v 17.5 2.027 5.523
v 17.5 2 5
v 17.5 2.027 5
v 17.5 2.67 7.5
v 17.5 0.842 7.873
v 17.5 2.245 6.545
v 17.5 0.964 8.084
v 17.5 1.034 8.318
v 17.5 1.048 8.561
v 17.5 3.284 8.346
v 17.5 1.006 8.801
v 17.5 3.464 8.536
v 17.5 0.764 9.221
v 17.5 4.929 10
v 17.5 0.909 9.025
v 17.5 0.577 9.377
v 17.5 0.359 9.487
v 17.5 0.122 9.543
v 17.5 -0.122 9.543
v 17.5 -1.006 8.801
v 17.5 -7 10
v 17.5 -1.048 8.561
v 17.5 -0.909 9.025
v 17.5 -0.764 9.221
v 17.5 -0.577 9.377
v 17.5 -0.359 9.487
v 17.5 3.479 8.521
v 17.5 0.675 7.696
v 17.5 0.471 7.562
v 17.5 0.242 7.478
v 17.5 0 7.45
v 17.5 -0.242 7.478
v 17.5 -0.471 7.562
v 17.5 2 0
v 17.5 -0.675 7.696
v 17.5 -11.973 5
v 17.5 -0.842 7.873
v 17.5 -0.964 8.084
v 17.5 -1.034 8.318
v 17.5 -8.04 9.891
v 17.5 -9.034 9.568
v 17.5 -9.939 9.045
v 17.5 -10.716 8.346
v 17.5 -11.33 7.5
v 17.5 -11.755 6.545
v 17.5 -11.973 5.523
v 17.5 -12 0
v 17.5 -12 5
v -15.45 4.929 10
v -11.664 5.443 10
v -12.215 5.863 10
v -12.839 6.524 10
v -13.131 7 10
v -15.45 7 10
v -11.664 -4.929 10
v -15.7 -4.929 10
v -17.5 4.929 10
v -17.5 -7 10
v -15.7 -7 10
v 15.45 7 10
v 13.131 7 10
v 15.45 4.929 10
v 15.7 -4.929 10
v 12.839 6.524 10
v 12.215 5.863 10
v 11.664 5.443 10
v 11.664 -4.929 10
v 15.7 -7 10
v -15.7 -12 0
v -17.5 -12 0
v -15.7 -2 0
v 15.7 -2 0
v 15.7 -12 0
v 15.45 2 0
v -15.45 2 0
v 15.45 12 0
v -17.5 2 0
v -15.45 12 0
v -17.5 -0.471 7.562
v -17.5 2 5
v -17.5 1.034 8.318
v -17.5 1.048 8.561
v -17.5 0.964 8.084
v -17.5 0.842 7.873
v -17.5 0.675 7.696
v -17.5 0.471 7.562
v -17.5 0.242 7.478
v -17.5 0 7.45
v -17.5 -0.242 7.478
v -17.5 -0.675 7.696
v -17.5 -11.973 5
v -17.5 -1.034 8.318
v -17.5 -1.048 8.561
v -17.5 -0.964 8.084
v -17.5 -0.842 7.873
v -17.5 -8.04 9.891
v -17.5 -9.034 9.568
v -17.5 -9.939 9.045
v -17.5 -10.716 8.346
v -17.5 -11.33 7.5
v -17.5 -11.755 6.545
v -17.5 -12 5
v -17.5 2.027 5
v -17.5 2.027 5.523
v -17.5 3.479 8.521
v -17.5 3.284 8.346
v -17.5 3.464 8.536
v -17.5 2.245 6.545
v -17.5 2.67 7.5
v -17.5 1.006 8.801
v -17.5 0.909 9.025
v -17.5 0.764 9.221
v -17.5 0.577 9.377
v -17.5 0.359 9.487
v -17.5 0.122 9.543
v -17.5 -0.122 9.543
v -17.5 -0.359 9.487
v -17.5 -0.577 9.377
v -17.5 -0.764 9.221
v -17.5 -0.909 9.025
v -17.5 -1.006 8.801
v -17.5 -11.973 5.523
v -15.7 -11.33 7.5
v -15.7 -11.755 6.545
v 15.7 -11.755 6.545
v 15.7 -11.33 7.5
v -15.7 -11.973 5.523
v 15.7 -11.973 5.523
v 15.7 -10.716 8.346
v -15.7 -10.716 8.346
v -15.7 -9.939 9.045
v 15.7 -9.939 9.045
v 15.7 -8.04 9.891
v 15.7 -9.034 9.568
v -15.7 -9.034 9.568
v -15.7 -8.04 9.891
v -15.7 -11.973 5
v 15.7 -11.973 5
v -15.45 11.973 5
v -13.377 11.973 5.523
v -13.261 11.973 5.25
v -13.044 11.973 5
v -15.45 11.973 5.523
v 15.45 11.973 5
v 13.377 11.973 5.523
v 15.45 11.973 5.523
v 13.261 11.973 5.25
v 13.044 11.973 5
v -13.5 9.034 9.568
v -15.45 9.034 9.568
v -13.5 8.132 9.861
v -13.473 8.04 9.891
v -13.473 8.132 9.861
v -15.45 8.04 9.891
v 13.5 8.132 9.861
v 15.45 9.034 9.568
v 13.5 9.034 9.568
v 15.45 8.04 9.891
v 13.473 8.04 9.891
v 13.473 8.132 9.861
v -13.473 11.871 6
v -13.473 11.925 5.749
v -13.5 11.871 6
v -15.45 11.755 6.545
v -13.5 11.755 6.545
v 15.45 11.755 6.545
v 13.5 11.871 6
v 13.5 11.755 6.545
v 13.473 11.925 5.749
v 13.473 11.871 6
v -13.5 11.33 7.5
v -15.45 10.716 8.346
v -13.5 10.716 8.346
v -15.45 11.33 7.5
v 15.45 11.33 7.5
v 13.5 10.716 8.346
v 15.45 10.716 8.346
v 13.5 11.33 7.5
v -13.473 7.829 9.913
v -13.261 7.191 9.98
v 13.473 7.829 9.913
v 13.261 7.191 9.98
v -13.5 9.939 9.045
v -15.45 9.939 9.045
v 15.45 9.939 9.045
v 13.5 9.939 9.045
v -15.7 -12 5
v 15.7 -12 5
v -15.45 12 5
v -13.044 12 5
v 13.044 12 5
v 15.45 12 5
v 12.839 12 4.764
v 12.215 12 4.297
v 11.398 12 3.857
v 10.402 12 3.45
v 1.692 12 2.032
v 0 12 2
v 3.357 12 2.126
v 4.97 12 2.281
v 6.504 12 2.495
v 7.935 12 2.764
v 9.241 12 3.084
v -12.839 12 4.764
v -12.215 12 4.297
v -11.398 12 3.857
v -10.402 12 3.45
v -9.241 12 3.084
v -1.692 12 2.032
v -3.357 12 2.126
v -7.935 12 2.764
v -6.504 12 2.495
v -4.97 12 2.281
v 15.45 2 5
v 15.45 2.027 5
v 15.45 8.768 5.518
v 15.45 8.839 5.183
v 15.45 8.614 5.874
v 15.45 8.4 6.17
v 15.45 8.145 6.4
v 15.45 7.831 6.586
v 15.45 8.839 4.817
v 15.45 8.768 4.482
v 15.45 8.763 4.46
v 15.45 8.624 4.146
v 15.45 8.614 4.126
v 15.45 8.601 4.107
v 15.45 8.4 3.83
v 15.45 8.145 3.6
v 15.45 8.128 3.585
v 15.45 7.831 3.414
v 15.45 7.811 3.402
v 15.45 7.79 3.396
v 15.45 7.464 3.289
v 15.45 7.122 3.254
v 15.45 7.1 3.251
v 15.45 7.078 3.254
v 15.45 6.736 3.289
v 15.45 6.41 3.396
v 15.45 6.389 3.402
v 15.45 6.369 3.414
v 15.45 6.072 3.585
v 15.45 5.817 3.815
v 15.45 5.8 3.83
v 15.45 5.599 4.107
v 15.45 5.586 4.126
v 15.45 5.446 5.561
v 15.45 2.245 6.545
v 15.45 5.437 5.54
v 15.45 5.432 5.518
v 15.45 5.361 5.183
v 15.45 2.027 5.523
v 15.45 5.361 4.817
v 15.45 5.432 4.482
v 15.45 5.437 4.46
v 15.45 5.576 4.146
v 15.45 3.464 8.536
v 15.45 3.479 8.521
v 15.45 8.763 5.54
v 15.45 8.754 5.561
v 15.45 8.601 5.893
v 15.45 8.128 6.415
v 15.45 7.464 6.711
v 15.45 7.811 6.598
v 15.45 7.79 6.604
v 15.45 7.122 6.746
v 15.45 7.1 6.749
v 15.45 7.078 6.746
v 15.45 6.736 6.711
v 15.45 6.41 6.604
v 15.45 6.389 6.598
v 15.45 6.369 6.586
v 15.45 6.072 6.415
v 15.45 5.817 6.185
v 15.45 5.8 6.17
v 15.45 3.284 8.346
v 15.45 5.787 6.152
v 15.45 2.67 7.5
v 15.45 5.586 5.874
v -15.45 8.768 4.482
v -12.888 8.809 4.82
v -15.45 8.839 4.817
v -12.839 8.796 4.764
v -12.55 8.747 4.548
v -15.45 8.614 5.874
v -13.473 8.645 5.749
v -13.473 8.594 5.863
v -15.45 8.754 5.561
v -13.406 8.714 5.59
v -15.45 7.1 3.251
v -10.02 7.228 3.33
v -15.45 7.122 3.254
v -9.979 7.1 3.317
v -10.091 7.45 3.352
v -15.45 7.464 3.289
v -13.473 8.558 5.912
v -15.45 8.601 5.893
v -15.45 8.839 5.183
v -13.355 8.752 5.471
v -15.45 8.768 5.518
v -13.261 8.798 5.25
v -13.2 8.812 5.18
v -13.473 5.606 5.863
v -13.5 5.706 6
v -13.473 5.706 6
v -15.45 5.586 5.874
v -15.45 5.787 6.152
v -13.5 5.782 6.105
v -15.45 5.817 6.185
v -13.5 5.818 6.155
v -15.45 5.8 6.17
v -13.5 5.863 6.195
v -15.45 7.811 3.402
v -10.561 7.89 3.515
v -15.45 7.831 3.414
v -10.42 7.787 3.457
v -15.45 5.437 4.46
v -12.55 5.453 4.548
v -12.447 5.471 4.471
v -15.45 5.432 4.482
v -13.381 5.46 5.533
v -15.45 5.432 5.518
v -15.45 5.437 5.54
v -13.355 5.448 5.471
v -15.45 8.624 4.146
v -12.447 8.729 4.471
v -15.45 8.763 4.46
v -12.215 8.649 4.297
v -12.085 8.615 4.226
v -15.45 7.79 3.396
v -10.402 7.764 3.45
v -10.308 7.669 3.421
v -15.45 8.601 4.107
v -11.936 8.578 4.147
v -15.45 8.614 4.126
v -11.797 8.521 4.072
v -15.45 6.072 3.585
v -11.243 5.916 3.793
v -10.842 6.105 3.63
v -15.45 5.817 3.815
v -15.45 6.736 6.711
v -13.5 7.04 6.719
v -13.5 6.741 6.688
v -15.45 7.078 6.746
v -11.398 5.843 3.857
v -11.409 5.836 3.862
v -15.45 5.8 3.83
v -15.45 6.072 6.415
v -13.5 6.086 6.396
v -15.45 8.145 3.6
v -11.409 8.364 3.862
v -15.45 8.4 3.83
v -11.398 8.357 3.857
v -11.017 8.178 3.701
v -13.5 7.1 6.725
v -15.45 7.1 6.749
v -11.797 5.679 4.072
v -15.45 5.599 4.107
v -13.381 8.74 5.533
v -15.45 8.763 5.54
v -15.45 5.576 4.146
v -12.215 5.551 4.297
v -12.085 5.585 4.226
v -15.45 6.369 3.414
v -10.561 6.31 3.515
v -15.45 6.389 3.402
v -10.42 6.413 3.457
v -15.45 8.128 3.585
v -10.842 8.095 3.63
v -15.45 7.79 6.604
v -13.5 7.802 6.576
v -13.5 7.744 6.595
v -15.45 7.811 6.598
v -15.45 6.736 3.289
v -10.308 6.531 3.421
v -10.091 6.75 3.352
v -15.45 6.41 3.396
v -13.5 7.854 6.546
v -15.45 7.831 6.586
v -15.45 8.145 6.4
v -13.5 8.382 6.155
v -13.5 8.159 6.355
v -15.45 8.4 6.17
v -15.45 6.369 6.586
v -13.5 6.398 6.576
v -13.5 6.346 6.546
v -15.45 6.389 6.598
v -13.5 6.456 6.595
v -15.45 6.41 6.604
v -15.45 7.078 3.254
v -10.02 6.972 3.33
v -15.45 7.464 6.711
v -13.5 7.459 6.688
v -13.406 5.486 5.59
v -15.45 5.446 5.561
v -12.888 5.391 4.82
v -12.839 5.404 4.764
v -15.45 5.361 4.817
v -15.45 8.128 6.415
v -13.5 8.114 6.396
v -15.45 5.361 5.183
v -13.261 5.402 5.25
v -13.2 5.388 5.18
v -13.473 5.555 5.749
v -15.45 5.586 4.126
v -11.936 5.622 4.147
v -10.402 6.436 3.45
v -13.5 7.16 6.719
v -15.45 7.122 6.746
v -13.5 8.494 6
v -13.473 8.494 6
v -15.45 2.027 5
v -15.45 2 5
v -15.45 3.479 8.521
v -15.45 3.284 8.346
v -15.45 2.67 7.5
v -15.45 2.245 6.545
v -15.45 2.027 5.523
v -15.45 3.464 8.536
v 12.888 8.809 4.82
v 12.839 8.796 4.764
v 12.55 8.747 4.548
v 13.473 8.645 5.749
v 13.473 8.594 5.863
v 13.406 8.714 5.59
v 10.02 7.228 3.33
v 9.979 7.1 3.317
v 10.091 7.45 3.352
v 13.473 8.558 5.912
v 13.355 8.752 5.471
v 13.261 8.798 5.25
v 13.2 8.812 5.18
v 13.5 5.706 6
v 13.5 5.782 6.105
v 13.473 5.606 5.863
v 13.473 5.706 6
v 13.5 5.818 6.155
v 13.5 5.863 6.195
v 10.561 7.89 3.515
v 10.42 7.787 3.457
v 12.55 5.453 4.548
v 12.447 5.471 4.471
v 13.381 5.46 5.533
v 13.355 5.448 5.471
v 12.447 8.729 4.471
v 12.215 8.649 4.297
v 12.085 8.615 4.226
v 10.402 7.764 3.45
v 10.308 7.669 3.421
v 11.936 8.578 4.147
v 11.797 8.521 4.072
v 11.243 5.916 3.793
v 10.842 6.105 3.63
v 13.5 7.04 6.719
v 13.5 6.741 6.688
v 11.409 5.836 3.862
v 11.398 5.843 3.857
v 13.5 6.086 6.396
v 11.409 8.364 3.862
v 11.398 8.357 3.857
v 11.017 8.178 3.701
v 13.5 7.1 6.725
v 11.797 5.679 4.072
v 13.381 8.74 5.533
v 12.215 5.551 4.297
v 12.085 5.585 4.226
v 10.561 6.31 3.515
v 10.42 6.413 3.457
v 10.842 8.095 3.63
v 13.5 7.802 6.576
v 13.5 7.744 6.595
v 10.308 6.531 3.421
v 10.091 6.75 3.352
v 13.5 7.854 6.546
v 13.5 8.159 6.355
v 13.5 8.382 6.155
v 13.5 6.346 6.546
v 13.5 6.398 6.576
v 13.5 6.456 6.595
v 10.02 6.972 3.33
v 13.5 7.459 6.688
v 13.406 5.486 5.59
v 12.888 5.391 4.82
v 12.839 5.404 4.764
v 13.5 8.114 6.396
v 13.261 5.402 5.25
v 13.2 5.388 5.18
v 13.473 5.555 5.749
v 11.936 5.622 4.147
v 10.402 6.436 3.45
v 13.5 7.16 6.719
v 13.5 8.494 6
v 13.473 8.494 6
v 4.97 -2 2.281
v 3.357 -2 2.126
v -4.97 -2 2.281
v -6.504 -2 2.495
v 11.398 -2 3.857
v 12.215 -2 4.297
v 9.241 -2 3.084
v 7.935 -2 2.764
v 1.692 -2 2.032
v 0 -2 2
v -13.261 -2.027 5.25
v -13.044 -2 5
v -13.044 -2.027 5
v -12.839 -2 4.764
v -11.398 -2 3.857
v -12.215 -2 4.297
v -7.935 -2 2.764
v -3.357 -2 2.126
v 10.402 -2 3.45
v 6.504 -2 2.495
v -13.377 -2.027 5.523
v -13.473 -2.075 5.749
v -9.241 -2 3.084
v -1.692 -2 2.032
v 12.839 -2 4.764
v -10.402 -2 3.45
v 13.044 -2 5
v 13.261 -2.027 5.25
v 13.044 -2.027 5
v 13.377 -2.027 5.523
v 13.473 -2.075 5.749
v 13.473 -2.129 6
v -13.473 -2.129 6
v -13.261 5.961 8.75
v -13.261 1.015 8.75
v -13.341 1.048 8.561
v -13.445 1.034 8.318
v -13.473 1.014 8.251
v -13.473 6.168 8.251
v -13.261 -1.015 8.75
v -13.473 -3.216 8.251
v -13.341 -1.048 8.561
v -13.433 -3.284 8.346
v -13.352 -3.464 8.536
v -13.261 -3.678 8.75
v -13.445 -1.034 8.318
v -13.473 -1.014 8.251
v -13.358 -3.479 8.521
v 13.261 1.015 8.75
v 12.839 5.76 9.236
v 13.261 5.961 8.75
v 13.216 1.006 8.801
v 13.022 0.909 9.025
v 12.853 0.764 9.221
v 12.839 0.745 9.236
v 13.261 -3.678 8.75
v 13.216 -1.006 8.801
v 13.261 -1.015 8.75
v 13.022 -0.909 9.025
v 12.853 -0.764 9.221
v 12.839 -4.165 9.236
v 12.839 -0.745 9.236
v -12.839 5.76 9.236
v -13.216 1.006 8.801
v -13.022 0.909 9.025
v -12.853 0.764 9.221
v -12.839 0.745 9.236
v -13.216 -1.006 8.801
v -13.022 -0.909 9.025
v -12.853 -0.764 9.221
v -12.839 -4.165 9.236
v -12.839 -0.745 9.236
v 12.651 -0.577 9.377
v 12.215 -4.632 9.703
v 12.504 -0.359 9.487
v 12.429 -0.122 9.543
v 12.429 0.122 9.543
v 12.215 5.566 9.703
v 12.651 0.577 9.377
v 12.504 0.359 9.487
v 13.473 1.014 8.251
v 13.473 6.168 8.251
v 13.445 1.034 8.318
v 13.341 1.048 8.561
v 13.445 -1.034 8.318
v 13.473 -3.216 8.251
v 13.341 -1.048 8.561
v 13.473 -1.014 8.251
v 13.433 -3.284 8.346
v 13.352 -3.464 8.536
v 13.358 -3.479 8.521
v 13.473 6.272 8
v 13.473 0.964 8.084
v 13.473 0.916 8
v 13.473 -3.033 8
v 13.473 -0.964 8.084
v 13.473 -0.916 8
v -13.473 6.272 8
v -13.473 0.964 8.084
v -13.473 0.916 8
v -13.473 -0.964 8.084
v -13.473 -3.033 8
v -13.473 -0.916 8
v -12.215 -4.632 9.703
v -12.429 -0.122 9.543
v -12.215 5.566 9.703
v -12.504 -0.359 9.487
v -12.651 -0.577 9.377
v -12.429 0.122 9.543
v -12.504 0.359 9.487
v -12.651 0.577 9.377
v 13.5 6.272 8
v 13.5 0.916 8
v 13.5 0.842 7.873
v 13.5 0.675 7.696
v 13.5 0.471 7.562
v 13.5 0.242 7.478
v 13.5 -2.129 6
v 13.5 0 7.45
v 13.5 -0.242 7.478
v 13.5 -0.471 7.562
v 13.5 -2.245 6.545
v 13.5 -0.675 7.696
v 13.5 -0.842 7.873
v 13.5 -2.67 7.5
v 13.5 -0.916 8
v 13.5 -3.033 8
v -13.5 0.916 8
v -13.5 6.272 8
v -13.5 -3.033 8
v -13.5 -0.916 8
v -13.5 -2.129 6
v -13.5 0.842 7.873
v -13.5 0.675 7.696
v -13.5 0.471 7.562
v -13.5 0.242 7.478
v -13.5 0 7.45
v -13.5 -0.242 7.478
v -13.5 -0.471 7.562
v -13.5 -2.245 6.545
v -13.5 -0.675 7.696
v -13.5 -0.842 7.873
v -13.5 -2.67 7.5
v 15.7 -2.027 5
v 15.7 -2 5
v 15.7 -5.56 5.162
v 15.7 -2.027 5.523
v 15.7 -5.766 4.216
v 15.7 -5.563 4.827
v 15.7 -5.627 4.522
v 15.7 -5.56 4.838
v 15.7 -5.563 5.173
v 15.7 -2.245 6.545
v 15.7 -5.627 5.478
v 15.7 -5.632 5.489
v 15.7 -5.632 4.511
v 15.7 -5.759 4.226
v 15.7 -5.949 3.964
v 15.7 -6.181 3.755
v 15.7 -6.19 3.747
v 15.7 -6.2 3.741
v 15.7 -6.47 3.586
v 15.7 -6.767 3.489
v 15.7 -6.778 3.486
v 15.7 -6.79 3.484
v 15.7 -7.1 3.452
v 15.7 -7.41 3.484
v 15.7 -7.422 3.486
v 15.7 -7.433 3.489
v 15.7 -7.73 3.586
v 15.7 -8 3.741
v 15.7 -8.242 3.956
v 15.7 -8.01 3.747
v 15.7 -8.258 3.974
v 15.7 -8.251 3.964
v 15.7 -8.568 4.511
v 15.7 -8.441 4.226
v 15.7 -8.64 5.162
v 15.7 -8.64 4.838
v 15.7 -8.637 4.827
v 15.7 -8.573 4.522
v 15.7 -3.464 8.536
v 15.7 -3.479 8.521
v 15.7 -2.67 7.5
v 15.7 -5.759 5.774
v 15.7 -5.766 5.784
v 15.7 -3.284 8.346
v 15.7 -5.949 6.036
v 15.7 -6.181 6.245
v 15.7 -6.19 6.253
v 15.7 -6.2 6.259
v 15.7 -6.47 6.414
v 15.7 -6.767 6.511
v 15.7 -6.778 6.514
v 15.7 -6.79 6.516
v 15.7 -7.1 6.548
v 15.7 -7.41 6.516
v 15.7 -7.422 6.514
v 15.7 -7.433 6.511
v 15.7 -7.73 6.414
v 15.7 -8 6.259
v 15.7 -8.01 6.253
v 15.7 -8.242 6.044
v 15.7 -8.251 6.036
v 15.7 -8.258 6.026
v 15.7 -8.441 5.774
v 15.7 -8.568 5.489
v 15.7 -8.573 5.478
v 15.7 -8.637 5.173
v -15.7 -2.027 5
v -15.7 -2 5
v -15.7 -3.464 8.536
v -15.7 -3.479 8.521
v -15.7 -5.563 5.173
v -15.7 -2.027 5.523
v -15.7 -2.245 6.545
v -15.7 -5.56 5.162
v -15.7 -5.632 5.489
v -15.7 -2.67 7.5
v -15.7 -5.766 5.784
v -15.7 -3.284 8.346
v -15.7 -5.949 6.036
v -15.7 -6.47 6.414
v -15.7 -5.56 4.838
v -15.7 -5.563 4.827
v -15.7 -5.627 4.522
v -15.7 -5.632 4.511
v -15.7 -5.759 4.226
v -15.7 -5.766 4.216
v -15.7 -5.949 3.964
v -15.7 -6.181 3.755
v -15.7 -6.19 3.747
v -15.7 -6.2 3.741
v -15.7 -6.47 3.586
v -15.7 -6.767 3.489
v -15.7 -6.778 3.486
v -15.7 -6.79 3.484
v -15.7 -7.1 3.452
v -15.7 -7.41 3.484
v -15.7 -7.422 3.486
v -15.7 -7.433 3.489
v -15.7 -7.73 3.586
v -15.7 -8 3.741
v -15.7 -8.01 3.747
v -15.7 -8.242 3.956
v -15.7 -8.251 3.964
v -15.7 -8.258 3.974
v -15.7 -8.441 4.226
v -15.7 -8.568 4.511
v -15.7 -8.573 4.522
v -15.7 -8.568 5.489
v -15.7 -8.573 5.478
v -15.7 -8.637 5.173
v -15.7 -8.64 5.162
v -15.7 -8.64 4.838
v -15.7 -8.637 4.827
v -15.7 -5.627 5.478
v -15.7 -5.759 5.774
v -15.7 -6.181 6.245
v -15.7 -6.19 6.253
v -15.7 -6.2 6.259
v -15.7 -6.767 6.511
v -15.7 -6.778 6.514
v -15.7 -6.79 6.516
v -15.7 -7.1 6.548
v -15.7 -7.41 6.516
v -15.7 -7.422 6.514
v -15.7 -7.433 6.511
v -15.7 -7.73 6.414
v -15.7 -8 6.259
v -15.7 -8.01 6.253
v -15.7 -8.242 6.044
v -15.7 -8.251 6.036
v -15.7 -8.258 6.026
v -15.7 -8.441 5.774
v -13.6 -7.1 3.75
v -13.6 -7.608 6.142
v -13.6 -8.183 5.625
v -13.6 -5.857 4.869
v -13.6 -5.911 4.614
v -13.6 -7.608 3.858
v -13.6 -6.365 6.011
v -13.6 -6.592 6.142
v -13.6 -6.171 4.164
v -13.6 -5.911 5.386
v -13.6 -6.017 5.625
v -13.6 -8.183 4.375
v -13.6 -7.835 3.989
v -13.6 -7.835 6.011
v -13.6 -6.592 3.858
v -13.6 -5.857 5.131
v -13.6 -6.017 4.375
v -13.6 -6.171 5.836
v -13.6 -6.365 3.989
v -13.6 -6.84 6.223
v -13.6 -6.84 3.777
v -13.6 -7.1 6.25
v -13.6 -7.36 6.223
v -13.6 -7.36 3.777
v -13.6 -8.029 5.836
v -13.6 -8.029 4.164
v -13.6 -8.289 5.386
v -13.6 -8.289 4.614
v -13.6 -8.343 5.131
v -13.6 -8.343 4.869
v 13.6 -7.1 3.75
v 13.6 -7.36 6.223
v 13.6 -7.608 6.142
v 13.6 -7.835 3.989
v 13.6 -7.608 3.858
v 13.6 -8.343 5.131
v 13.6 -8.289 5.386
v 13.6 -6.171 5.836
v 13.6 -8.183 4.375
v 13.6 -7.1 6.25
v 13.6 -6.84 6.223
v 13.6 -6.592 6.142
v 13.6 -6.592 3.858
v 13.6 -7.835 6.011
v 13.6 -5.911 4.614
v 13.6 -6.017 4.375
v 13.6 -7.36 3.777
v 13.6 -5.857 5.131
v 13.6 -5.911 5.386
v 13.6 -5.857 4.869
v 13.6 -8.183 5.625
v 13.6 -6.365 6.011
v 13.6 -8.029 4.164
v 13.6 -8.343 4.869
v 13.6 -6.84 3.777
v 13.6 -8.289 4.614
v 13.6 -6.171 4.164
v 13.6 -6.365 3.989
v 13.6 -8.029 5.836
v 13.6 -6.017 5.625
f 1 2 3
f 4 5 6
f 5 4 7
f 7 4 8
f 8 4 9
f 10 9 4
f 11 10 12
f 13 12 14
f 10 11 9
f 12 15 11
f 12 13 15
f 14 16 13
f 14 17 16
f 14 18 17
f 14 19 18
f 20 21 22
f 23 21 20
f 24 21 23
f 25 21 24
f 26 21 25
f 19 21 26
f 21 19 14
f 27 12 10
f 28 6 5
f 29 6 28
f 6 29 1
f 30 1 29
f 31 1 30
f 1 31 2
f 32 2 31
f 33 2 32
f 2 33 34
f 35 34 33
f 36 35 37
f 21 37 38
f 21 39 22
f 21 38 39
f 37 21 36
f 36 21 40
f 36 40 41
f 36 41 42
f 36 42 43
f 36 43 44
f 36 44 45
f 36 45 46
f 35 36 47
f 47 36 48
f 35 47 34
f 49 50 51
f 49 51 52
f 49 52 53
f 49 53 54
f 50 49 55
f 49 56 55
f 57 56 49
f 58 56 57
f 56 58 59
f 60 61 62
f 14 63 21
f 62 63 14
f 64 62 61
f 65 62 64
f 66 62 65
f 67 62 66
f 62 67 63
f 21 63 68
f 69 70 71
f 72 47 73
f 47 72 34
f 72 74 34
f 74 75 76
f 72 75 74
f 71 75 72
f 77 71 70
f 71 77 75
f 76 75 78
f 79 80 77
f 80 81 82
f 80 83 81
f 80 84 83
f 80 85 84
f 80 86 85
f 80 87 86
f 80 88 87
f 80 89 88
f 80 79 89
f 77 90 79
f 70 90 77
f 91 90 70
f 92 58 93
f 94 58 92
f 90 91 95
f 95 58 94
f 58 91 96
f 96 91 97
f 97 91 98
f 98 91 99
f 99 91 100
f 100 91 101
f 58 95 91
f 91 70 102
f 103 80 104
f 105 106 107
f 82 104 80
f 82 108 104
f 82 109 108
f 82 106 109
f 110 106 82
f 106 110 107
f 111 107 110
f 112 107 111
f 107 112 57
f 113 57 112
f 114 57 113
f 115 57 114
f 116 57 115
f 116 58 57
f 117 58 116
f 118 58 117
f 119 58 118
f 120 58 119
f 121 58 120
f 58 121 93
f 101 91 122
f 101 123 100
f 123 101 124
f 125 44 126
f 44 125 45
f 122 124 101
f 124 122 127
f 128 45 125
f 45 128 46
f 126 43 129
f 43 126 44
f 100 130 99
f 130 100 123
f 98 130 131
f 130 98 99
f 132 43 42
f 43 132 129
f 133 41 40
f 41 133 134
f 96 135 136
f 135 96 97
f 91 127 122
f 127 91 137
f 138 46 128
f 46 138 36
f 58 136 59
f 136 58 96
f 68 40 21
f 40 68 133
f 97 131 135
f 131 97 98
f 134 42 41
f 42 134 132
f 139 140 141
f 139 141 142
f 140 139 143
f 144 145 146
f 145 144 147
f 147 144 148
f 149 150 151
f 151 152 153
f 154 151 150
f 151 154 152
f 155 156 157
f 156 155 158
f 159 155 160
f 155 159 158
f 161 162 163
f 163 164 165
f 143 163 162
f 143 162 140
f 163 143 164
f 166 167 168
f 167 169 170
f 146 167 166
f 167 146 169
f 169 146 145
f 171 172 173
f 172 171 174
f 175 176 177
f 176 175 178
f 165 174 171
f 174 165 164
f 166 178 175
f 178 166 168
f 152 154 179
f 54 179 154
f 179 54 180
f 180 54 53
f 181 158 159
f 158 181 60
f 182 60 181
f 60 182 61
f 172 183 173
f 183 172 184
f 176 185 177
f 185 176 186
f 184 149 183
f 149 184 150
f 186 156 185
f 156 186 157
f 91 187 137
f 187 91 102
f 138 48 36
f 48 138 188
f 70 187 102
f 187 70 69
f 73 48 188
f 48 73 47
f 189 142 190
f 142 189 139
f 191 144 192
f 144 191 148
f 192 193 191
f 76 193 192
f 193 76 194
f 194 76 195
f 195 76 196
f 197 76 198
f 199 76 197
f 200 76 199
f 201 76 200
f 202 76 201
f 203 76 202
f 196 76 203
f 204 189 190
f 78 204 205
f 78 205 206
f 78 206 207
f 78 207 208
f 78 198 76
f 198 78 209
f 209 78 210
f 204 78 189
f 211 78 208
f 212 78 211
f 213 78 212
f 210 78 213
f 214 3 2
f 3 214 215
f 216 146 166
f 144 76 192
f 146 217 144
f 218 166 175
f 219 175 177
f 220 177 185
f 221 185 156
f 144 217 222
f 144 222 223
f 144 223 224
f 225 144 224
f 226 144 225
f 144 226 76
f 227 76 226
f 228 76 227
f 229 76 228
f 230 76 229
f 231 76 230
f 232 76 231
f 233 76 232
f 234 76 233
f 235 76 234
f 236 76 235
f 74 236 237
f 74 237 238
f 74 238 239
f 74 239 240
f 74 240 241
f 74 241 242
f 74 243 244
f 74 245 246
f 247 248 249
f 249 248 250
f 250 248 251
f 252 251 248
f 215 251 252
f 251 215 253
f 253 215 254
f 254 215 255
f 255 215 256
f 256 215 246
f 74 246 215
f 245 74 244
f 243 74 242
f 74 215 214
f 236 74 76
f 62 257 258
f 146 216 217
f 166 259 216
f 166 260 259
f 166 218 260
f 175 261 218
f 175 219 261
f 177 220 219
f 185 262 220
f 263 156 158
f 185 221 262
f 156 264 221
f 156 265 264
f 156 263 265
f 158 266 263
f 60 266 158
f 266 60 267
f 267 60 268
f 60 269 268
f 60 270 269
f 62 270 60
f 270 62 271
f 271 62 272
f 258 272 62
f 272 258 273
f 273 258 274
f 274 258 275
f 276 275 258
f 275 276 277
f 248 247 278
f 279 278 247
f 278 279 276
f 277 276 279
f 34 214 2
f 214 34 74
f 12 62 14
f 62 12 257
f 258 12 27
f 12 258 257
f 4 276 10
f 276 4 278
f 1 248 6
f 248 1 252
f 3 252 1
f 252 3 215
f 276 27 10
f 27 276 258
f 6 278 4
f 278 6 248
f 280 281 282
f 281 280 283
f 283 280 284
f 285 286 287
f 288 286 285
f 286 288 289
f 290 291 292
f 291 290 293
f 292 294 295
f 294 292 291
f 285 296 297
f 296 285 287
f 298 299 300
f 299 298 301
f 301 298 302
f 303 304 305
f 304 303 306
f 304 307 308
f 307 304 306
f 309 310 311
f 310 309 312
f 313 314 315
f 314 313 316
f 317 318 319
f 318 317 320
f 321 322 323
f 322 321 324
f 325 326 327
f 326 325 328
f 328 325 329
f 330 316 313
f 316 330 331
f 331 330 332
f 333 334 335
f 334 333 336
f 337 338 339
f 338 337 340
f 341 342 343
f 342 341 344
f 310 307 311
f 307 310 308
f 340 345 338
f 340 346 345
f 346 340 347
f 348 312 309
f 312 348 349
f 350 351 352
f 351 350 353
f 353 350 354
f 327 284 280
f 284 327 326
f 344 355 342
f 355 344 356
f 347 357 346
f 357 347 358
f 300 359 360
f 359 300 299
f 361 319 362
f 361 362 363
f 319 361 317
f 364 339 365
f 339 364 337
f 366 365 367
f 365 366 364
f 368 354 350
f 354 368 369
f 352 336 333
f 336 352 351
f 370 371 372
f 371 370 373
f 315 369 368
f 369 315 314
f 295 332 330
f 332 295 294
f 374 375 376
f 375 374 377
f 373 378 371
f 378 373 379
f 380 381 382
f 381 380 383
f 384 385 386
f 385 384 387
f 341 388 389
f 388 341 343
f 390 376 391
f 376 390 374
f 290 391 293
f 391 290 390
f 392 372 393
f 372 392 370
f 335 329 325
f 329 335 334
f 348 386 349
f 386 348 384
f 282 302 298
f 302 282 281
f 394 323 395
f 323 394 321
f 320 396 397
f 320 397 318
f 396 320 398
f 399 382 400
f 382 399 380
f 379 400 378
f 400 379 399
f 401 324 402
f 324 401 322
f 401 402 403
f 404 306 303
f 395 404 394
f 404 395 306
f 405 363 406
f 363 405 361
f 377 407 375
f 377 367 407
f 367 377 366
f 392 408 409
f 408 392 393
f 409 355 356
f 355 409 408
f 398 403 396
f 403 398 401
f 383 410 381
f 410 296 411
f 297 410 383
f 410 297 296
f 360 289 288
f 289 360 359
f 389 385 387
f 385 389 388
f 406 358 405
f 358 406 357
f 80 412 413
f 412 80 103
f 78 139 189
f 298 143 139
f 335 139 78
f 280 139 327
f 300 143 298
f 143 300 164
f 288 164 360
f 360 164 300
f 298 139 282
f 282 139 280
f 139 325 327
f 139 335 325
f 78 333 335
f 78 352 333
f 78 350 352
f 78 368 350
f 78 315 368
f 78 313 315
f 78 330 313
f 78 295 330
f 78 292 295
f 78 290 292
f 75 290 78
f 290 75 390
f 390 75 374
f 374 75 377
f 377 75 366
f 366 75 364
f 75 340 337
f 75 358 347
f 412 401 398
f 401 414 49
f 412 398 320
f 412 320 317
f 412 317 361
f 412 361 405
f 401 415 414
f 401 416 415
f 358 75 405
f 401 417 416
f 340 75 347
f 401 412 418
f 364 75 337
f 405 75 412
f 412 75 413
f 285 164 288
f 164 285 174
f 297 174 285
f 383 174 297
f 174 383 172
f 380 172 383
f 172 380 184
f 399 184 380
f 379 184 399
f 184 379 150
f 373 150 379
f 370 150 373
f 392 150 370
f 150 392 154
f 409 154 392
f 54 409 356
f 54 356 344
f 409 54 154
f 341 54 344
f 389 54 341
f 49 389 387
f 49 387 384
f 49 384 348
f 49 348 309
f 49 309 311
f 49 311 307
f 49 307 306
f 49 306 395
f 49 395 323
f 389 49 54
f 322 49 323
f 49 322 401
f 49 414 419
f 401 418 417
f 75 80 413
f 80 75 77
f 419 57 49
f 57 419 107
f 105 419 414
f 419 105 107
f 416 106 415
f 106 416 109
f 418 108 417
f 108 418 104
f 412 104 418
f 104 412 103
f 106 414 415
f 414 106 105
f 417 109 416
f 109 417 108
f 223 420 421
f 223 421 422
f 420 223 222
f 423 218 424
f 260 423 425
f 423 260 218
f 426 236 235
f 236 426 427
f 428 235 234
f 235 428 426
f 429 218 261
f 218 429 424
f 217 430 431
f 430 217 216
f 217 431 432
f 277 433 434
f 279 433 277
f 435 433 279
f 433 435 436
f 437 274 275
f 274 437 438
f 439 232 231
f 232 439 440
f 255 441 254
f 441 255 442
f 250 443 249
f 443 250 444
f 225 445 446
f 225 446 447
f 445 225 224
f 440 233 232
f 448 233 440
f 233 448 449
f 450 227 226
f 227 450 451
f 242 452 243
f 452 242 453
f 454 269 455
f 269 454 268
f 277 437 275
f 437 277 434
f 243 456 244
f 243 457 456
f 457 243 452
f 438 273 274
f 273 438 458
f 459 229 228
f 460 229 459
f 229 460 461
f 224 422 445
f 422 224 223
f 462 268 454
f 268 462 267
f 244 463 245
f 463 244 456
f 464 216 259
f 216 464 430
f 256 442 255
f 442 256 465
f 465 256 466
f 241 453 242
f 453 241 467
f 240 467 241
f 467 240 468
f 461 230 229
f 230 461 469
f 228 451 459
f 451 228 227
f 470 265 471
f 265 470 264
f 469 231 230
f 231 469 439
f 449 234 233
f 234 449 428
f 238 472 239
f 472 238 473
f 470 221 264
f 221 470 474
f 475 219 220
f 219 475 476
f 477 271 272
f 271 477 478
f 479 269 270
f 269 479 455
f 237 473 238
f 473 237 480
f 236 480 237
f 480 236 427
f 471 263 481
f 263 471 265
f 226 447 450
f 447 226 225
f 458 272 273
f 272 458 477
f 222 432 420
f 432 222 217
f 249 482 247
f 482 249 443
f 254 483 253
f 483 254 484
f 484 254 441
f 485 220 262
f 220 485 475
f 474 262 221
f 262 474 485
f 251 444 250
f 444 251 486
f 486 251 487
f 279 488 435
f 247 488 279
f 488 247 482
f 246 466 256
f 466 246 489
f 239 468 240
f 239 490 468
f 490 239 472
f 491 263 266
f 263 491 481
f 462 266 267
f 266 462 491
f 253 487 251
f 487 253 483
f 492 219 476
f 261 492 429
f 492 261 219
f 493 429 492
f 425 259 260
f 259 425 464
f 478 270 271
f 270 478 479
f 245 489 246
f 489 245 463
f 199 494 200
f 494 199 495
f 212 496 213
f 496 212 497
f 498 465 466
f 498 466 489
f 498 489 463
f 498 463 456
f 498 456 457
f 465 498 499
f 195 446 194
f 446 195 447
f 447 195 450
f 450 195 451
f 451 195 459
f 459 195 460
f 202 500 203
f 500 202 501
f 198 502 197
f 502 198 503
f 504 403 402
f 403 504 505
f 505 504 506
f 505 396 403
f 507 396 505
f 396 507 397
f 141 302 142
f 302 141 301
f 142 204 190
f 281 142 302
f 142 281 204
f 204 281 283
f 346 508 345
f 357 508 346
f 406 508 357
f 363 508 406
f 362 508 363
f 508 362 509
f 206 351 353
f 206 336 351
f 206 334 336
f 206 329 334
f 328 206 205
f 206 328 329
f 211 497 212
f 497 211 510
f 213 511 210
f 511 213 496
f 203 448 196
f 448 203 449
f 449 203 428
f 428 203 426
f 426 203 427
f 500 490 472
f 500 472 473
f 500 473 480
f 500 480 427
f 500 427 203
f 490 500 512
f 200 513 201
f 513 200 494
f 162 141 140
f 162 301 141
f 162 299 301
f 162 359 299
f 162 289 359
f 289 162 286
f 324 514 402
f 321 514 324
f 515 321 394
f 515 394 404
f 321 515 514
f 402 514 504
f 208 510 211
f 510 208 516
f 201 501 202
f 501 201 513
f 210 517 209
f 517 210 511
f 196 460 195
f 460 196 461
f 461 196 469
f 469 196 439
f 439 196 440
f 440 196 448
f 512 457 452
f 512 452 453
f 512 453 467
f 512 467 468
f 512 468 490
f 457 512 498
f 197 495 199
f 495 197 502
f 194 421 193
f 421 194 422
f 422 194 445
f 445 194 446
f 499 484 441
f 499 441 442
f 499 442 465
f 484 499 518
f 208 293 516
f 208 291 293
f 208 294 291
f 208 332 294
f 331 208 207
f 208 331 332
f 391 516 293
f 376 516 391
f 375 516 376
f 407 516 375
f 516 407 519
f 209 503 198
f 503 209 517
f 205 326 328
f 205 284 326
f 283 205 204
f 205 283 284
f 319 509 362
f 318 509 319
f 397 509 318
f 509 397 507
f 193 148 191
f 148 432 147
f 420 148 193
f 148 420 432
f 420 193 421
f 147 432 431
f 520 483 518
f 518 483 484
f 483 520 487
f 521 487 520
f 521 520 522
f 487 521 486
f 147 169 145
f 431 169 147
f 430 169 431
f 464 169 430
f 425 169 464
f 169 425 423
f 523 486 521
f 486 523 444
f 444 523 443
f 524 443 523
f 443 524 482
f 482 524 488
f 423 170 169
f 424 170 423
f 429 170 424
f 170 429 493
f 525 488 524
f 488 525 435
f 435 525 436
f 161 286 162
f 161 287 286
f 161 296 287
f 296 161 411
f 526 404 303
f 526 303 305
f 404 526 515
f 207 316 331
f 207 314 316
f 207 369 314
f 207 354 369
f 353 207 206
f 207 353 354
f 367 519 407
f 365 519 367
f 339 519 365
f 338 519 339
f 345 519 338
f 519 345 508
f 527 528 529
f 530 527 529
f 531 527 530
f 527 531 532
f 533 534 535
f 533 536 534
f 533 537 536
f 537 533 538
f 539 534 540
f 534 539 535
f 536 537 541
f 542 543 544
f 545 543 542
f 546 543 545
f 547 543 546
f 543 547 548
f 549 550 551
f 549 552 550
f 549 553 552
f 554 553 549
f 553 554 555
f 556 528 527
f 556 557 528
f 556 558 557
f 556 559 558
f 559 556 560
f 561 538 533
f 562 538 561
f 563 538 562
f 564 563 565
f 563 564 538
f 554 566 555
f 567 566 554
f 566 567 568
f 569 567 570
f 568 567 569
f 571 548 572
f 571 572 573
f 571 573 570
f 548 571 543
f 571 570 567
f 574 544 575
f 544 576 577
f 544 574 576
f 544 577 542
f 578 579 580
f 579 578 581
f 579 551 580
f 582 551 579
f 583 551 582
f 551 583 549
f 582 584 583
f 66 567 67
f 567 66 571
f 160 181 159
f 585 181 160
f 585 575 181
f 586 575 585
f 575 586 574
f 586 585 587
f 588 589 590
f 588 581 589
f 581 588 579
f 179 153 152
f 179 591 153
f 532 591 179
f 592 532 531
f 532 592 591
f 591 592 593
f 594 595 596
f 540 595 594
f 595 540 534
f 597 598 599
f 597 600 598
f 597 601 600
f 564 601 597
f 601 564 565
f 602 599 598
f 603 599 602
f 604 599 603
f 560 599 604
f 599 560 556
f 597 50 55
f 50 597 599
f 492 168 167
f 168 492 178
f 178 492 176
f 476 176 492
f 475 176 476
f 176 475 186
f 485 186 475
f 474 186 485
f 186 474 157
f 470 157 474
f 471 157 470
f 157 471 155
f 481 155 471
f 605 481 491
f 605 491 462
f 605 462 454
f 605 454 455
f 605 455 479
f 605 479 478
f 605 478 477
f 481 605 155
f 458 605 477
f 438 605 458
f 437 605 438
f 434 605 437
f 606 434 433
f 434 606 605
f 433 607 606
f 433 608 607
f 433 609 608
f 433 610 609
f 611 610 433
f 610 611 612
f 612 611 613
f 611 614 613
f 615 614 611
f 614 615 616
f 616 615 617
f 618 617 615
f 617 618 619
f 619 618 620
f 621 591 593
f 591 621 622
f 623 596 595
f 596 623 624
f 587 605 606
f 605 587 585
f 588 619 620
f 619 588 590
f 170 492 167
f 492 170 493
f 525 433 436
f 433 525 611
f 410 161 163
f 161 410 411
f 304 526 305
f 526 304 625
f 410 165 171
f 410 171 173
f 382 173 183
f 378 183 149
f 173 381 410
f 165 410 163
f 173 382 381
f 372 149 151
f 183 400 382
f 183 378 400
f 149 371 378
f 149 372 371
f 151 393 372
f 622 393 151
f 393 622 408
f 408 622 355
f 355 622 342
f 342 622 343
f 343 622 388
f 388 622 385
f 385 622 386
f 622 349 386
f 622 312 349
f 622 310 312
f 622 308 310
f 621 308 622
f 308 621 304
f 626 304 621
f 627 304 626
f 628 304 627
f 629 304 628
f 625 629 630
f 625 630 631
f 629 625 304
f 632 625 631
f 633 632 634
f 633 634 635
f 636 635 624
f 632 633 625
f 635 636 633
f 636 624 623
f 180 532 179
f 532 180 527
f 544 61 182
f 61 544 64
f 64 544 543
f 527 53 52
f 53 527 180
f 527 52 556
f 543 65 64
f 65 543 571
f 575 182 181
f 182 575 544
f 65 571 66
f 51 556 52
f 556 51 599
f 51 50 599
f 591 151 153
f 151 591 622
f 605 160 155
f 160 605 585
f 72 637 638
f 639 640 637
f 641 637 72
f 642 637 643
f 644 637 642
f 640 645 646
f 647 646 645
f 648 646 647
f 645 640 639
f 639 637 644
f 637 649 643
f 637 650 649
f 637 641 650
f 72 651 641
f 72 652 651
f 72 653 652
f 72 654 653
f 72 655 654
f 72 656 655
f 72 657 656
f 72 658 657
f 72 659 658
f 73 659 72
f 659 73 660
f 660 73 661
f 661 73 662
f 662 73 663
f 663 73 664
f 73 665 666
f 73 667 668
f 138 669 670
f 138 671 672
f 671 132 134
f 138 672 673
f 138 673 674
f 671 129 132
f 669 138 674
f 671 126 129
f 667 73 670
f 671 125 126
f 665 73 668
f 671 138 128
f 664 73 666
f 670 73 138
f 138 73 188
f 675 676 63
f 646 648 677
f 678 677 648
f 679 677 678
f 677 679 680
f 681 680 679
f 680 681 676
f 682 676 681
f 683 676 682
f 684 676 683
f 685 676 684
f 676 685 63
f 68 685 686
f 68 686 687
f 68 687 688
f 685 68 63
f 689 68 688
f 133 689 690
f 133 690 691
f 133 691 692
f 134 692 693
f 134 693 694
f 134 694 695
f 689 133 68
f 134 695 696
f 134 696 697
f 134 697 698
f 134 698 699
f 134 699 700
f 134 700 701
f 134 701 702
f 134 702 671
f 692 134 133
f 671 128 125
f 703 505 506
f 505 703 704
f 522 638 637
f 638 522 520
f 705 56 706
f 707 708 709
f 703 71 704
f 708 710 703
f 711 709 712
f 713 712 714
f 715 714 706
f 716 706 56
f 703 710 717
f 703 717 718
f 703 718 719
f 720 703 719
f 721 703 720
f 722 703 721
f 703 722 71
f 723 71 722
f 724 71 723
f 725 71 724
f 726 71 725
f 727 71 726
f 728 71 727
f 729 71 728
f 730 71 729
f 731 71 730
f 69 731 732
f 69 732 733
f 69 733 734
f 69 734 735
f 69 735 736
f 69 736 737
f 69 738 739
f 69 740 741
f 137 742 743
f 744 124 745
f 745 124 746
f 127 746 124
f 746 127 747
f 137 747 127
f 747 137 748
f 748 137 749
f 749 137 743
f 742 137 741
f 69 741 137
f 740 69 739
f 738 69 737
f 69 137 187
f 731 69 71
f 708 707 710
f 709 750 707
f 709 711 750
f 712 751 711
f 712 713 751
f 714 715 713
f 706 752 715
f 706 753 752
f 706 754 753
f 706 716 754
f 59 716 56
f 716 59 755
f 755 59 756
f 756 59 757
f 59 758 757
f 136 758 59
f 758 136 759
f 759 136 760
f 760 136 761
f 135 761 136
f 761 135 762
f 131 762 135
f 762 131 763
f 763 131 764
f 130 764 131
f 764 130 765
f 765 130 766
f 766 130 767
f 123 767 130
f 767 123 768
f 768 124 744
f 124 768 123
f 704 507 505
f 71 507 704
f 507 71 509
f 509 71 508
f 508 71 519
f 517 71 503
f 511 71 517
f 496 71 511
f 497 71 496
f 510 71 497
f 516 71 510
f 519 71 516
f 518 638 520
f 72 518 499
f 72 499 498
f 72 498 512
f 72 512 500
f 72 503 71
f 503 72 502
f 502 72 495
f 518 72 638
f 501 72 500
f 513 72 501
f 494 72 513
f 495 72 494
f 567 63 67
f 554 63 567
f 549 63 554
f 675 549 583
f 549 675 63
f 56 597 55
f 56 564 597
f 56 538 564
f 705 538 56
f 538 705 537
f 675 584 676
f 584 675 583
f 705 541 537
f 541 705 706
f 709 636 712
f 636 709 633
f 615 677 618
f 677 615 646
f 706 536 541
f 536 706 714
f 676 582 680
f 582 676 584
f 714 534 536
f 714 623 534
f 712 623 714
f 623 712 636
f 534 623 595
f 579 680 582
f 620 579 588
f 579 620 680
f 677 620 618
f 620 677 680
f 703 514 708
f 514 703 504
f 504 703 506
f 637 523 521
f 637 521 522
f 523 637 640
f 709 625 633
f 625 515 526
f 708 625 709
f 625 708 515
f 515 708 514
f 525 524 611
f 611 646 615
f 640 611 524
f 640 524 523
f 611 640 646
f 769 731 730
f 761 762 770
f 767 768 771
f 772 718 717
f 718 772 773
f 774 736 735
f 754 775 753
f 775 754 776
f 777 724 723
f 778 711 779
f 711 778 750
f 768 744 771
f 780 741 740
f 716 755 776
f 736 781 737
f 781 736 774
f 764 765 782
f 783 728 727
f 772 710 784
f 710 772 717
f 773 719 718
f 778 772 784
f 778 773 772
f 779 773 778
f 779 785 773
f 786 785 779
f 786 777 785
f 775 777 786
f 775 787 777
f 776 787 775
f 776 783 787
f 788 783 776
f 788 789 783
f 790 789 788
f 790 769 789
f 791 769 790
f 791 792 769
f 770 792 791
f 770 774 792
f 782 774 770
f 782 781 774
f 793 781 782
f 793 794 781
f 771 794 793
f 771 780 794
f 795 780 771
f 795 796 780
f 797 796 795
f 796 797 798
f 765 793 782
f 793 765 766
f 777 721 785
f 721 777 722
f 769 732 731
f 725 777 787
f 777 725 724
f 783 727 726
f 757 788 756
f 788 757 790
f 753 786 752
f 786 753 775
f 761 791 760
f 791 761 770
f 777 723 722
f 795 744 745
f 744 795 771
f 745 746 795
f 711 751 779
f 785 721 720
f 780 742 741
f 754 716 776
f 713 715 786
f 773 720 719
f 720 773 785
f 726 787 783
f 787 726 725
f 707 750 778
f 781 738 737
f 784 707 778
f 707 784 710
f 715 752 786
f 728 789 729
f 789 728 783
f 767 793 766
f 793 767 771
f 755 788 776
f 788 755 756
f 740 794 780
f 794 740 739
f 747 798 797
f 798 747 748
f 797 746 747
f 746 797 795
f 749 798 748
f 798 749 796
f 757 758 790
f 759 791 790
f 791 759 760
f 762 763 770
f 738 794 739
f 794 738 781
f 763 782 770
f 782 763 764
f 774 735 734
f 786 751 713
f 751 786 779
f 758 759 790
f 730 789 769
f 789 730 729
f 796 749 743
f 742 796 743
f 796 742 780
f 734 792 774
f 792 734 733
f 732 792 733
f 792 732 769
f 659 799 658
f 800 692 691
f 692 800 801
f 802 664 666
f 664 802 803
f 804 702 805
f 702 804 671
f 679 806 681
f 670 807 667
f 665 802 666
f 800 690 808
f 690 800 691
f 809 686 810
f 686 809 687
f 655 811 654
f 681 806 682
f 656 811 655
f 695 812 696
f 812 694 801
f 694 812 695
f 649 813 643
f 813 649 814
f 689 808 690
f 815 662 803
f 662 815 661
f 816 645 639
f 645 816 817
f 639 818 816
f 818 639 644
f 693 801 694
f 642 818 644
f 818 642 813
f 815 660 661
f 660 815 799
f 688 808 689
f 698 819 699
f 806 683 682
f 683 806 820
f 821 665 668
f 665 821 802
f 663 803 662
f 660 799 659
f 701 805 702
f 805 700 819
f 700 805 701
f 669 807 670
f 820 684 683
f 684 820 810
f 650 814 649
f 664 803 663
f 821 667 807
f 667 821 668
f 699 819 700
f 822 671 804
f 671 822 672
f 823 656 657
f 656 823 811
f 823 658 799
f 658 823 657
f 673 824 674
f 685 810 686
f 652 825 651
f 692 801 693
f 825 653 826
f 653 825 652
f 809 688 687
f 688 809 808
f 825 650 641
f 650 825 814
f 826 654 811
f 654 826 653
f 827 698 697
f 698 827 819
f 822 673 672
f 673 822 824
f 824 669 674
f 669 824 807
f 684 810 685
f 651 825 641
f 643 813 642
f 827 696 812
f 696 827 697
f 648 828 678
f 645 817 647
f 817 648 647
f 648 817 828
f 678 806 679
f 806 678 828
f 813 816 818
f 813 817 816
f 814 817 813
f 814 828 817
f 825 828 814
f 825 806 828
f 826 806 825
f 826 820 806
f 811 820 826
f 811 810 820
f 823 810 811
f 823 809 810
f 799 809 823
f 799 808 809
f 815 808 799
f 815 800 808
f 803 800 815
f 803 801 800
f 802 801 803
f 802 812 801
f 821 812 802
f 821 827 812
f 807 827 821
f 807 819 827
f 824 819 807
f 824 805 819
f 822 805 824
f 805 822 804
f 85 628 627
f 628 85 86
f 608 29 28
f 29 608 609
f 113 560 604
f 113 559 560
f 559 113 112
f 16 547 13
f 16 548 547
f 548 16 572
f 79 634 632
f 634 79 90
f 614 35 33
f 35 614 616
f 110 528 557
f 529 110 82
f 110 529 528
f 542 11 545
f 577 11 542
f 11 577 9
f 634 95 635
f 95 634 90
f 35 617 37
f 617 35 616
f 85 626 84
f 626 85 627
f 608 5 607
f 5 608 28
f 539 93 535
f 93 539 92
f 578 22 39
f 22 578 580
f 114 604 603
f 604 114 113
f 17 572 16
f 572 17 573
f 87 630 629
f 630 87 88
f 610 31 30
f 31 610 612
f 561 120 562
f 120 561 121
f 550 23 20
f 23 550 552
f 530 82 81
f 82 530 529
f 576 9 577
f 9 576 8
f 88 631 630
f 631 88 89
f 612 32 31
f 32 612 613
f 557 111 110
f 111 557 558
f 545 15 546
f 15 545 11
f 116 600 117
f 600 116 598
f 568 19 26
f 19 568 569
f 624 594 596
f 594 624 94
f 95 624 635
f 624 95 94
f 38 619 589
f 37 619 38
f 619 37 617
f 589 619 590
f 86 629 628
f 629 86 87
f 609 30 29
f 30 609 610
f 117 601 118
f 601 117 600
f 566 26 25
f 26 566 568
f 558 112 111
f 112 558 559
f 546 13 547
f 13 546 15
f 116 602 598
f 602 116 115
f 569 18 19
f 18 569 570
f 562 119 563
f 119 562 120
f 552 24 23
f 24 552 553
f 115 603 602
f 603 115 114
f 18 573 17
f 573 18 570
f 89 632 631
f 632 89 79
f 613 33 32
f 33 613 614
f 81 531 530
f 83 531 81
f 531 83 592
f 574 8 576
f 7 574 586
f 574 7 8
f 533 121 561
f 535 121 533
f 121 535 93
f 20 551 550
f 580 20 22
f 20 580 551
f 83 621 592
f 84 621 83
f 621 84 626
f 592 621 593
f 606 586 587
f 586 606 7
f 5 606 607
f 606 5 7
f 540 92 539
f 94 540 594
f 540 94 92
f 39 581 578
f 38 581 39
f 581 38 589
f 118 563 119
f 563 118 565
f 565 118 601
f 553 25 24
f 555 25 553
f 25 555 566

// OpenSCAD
max_angle = 50;  // maximum allowed bending-angle
tolerance = 0.2; // for better fit

module outline(width, length, height, radius, l1, angle)
{
	y_ofs = l1 / 2;
	t     = radius / 2;

	difference() {
		union() {
			translate([0, 0, height/2])    cube([width,l1,height], true);
			translate([0, -y_ofs, radius]) rotate([0, 90, 0]) cylinder(width, r = radius, center = true, $fs=0.5);
			translate([0,  y_ofs, radius]) rotate([0, 90, 0]) cylinder(width, r = radius, center = true, $fs=0.5);
			translate([0, -y_ofs, radius]) rotate([angle,     0, 0]) translate([0, -t, -t]) cube([width,radius,radius], true);
			translate([0,  y_ofs, radius]) rotate([360-angle, 0, 0]) translate([0,  t, -t]) cube([width,radius,radius], true);
		}
		translate([0, 0, -(t/2)]) cube([width,length,t], true);
	}
}

module axis(x_ofs, y_ofs, z_ofs, length, radius)
{
	rad = (radius * 0.25);
	translate([x_ofs,y_ofs,z_ofs]) rotate([0, 90, 0]) cylinder(length+tolerance, r1 = rad*1.25, r2 = rad, center = true, $fs=0.25);
}

module axis_hole(x_ofs, y_ofs, z_ofs, length, radius)
{
	rad = (radius * 0.25) * 1.25;
	translate([x_ofs,y_ofs,z_ofs]) rotate([0, 90, 0]) cylinder(length+tolerance, r1 = rad+tolerance, r2 = rad, center = true, $fs=0.25);
}

module outcut0(width, radius, h1, thick, angle, inner_axis)
{
	w = (width - thick)/2;
	t = thick + tolerance/2;

	translate([w, 0, 0]) union() {
		difference() {
			union() {
				translate([0,0,h1/2]) cube([t,radius*2, h1], true);
				translate([0,0,h1]) rotate([angle, 0, 0]) translate([0,radius/2,0]) cube([t,radius,radius*2], true);
				translate([0,0,h1]) rotate([0, 90, 0]) cylinder(t, r = radius, center = true, $fs=0.5);
				if (inner_axis) {
					axis_hole(-(1.5*w), tolerance/2, h1,w,radius);
				}
			}
			if (!inner_axis) {
				axis(-(tolerance)/2, tolerance/2, h1,thick,radius);
			}
		}
	}
}
module outcut(width, radius, l1, h1, thick, angle, inner_axis)
{
	translate([0,l1/2,0]) union() {
		outcut0(width, radius, h1, thick, angle, inner_axis);
		mirror([1,0,0]) outcut0(width, radius, h1, thick, angle, inner_axis);
	}
}

module incut(width, radius, l1, h1, thick, angle, inner_axis)
{
	width2 = width - 2*(thick-tolerance);

	translate([0,-(l1/2),h1]) difference() {
		union() {
			translate([0,0,-(h1/2)]) cube([width2,radius*2,h1], true);
			translate([0,0,0]) rotate([180-angle,0,0]) translate([0,radius/2,0]) cube([width2, radius, radius*2], true);
			translate([0,0,0]) rotate([0, 90, 0]) cylinder(width2, r = radius, center = true, $fs=0.5);
			if (!inner_axis) {
				axis_hole((width-thick)/2+tolerance, -(tolerance/2), 0,thick,radius);
				mirror([1,0,0]) axis_hole((width-thick)/2+tolerance, -(tolerance/2), 0,thick,radius);
			}
		}
		if (inner_axis) {
			axis(-((width2-thick)/2), -(tolerance/2), 0,thick,radius);
			mirror([1,0,0]) axis(-((width2-thick)/2), -(tolerance/2), 0,thick,radius);
		}
	}
}

module middle_0(length, radius, thick, closed)
{
	if (closed) {
		cube([radius*2,length,radius*2], true);
	} else {
		rotate([90, 90, 0]) cylinder(length, r = radius, center = true, $fn=50);
		translate([0,0,thick]) rotate([90, 90, 0]) cylinder(length, r = radius, center = true, $fn=50);
		translate([0,0,thick/2]) cube([2*radius,length,thick], true);
	}
}
module middle(width, radius, length, height, l1, h1, thick, over, under, inner_axis, closed)
{
	l = length;
	th = max(thick,thick * height/width);
	h = height - (closed ?2 :1)*th;
	w = width - 4*thick;
	r = h / 2;
	scale(v=[w/h,1,1]) translate(v = [0,0,r+th]) union() {
		translate([0,h1,0]) middle_0(l, r, th, closed);
		translate([0,(l1/2)+0.1,0]) {
			difference() {
				rotate([over,0,0]) union() {
					translate([0, l/4, 0]) middle_0(l/2, r, th, closed);
					translate([0, l/4,-r]) cube([2*r,l/2,2*r], true);
				}
				translate([0, l/4,-r]) cube([2*r,l/2,2*r], true);
			}
			difference() {
				rotate([-under,0,0]) union() {
					translate([0, l/4, 0]) middle_0(l/2, r, th, closed);
					translate([0, l/4,r]) cube([2*r,l/2,2*r], true);
				}
				translate([0, l/4,r]) cube([2*r,l/2,2*r], true);
			}
		}
	}
}

module hole(width, height, closed)
{
	if (!closed) {
		translate([0,0,height-1.5]) rotate([0, 90, 0]) cylinder(width+1, r = 1.05, center = true, $fs=0.25);
	}
}

module chain_link(width, length, height, under_angle, over_angle, inner_axis, closed)
{
	thick = min(2,max(1, 0.1*width));
	radius = height / 2;
	len    = max(length, 2*(height+thick));
	l1     = len - (2 * radius);
	h1     = radius;
	under  = min(max_angle, under_angle);
	over   = min(max_angle, over_angle);

	difference() {
		outline(width, len, height, radius, l1, under);
		outcut(width, radius, l1, h1, thick, over,  inner_axis);
		middle(width, radius, len, height, l1, h1, thick, over, under, inner_axis, closed);
		incut(width, radius, l1, h1, thick, over, inner_axis);
		hole(width, height, closed);
	}
}

// show three chain-links connected at maximum bending angles
module debug(width, length, height, under_angle, over_angle, inner_axis, closed)
{
	thick = min(2,max(1, 0.1*width));
	radius = height / 2;
	len    = max(length, 2*(height+thick));
	l1     = len - (2 * radius);
	y_ofs  = (l1 / 2) + 0.1;
	z_ofs  = radius;

	chain_link(width, length, height, under_angle, over_angle, inner_axis, closed);
	translate(v = [0, -y_ofs,z_ofs]) rotate(a = [min(max_angle, under_angle),0,0]) translate(v = [0,-y_ofs,-z_ofs]) chain_link(width, length, height, under_angle, over_angle, inner_axis, closed);
	translate(v = [0, y_ofs,z_ofs]) rotate(a = [min(max_angle, over_angle),0,0]) translate(v = [0,y_ofs,-z_ofs]) chain_link(width, length, height, under_angle, over_angle, inner_axis, closed);
}
//debug(15, 18, 10, 30, 30, true, false);

chain_link(width= 35, length=20, height=10, under_angle=0, over_angle=45, inner_axis=true, closed=false);

// width, lenght, height are obvious...
// under_angle - max. angle allowed to bend downwards
// over_angle  - max. angle allowed to bend upwards
// inner_axis  - boolean: true - connectors go from outside to inside; false - vise versa
// closed  - boolean: true - top is closed, no holes; false - top is open, hole on both sides (for toothpick piece)
